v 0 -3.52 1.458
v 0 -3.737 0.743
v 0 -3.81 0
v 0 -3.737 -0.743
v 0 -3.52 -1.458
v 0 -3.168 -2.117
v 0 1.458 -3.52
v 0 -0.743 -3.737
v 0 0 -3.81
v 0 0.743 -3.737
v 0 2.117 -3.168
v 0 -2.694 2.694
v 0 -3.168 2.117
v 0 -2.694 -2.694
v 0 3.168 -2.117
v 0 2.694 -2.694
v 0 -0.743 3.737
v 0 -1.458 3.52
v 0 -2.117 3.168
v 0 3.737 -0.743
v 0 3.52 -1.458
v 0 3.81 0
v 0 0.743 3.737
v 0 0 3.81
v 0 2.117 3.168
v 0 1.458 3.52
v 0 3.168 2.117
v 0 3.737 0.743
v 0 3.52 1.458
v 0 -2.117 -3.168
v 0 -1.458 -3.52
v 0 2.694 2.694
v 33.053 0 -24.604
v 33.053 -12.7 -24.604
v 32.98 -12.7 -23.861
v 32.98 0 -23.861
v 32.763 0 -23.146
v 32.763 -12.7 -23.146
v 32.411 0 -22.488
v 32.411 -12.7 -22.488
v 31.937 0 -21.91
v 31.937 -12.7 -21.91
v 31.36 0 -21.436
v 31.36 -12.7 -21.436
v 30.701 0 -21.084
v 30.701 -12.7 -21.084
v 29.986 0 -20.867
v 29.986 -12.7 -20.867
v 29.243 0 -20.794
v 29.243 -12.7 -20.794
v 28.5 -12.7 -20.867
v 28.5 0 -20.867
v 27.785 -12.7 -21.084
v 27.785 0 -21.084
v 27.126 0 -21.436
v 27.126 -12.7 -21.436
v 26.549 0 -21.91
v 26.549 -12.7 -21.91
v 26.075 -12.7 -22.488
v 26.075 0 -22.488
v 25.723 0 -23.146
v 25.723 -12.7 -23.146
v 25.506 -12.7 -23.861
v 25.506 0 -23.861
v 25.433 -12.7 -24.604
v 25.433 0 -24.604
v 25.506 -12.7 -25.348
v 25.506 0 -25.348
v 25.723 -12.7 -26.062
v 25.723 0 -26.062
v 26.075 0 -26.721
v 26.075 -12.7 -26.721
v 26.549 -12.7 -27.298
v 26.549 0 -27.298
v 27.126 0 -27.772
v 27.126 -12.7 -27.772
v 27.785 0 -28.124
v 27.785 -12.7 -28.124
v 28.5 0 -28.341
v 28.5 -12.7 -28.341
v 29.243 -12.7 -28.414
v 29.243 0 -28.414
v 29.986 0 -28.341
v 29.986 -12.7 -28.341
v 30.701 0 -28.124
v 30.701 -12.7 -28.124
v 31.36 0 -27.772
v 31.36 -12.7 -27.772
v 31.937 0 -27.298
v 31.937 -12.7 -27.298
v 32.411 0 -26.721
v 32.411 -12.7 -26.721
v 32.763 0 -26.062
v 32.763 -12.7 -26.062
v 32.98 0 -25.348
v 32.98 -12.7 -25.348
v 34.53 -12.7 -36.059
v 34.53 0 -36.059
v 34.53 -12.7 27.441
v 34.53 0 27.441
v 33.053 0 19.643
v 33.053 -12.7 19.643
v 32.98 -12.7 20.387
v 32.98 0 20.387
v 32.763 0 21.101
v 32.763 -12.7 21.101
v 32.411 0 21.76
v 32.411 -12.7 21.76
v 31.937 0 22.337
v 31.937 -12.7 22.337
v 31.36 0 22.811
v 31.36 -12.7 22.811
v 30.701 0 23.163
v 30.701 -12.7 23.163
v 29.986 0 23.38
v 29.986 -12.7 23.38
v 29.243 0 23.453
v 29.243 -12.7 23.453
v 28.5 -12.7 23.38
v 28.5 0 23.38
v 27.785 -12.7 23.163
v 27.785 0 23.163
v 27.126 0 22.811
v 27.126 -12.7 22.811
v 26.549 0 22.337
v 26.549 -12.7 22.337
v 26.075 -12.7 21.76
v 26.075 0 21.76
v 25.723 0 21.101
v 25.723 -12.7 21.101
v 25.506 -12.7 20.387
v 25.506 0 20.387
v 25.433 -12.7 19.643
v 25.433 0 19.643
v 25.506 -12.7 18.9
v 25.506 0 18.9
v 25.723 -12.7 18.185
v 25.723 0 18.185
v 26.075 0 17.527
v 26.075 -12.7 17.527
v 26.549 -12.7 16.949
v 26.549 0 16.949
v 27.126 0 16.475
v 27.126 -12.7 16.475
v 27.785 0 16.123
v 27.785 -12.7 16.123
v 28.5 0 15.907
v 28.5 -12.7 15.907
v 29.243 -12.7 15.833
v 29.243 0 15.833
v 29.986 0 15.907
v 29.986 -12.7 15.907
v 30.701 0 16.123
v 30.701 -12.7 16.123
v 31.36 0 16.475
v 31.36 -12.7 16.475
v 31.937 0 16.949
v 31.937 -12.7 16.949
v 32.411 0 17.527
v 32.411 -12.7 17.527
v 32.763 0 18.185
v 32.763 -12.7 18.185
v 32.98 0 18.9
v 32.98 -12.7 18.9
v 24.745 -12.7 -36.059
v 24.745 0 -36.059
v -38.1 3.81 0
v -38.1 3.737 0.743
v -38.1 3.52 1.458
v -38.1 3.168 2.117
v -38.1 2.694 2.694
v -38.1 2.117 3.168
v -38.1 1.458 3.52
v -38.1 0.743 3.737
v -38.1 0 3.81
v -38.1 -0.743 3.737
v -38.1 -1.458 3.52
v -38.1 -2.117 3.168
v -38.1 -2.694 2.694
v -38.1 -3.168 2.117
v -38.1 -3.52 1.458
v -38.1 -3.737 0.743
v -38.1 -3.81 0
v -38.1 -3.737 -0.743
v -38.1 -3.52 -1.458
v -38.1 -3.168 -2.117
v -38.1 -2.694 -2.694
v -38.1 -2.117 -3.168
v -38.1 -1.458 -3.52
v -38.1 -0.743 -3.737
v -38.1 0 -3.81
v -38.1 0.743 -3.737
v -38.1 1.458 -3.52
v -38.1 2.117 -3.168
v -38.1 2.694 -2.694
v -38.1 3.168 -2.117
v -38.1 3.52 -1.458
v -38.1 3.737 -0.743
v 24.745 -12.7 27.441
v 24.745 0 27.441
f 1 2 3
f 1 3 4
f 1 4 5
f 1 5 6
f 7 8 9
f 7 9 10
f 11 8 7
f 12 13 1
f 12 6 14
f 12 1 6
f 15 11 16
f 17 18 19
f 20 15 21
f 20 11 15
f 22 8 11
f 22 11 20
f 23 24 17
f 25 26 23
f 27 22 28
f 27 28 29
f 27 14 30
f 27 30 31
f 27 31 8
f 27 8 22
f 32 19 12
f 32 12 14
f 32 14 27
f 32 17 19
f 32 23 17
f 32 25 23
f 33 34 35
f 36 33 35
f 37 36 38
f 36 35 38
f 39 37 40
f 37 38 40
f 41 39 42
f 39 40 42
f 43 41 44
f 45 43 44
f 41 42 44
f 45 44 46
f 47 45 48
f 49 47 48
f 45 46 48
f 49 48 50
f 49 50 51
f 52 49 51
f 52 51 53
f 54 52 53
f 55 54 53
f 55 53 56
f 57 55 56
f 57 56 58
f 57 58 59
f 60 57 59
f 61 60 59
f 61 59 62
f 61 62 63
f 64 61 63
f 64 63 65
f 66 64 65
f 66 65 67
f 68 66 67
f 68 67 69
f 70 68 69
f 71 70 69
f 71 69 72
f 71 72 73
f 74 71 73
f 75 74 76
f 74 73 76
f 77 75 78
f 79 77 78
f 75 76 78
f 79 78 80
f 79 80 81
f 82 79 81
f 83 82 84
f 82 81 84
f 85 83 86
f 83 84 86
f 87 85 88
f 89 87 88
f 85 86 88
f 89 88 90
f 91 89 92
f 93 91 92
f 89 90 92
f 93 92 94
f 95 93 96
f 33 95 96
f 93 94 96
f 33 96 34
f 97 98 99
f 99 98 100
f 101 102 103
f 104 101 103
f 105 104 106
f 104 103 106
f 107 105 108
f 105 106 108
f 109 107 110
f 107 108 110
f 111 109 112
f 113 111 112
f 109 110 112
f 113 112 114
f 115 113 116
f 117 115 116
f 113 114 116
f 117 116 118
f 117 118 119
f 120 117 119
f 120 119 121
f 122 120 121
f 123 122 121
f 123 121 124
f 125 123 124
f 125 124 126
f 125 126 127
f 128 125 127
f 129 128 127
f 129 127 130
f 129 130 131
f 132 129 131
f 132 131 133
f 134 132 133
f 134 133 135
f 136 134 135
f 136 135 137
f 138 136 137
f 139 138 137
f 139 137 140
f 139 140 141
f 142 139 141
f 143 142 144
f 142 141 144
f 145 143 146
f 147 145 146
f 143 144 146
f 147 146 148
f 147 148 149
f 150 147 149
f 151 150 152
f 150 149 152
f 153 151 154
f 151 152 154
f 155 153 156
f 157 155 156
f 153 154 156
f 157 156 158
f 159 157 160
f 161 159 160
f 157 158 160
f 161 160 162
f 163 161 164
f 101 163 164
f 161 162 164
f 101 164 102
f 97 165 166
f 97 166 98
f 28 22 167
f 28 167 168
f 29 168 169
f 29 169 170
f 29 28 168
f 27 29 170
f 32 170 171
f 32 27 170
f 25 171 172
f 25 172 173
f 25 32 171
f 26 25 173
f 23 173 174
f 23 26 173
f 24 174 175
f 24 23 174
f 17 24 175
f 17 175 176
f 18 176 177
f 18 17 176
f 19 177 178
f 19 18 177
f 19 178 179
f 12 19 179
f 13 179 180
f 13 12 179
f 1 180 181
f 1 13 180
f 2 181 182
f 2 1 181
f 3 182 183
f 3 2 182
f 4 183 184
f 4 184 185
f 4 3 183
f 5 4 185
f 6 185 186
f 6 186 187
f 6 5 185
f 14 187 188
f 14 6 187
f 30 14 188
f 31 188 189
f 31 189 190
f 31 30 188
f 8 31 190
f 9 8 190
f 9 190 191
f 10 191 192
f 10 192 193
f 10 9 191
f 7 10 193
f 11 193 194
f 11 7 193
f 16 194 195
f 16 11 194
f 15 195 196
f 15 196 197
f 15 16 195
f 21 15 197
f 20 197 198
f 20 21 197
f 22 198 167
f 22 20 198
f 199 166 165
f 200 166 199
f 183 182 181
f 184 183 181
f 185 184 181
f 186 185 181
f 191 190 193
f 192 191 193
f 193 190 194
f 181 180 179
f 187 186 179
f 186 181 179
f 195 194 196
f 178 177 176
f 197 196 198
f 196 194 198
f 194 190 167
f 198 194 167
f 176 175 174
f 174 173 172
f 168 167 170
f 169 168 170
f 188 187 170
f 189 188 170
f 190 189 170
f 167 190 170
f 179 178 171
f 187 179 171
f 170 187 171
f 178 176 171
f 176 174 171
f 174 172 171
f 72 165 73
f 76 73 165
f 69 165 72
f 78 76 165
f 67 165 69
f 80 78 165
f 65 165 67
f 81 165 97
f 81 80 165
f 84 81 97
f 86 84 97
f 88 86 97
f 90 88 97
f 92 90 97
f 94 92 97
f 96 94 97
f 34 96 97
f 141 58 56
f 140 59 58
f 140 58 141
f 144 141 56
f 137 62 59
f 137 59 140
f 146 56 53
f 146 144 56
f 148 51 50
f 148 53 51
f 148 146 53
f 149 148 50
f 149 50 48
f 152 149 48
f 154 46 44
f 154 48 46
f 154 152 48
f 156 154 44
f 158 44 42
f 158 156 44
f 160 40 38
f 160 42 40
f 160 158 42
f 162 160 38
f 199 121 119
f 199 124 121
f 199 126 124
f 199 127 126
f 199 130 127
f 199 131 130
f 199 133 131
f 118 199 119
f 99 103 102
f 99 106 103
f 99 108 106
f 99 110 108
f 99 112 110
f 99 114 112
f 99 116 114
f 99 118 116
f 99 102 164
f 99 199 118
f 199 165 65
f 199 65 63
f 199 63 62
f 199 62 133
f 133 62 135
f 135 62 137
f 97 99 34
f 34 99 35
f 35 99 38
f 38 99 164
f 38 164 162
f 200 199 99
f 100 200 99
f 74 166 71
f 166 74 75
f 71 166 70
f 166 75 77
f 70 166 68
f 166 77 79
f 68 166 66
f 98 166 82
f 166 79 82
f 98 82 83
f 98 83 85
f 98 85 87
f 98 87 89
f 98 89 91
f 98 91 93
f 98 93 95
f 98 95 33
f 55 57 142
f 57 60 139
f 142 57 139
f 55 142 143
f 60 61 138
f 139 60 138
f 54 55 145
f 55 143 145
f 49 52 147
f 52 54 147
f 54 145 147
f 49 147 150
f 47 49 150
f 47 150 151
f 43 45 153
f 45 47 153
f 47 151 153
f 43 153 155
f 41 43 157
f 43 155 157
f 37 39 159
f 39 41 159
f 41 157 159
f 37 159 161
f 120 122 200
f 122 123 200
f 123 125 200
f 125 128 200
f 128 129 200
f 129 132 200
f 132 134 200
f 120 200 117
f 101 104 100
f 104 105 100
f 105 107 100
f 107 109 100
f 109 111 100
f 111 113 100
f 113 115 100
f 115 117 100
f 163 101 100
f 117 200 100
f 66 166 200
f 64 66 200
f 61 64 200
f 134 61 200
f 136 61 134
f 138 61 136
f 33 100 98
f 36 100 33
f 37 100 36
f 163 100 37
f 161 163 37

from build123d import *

# Parameters (mm, degrees)
F0_R     = 3.81
F1_DEPTH = 38.1
F2_W     = 9.785209
F2_H     = 63.5
F3_DEPTH = 12.7
F4_R     = 3.81
F5_DEPTH = 25.4


with BuildPart() as f1:
    # F0 (on Right) → F1 (new body)
    with BuildSketch(Plane.YZ):
        Circle(F0_R)
    extrude(amount=-F1_DEPTH)


with BuildPart() as f3:
    # F2 (on Front) → F3 (new body)
    with BuildSketch(Plane.XZ):
        with Locations((29.637735, -4.309282)):
            Rectangle(F2_W, F2_H)
    extrude(amount=F3_DEPTH)

    # F4 (on face) → F5 (cut)
    with BuildSketch(Plane.XZ.offset(12.7)):
        with Locations((29.242888, 19.643334)):
            Circle(F4_R)
        with Locations((29.242888, -24.604234)):
            Circle(F4_R)
    extrude(amount=-F5_DEPTH, mode=Mode.SUBTRACT)


solid = Compound([f1.part, f3.part])
